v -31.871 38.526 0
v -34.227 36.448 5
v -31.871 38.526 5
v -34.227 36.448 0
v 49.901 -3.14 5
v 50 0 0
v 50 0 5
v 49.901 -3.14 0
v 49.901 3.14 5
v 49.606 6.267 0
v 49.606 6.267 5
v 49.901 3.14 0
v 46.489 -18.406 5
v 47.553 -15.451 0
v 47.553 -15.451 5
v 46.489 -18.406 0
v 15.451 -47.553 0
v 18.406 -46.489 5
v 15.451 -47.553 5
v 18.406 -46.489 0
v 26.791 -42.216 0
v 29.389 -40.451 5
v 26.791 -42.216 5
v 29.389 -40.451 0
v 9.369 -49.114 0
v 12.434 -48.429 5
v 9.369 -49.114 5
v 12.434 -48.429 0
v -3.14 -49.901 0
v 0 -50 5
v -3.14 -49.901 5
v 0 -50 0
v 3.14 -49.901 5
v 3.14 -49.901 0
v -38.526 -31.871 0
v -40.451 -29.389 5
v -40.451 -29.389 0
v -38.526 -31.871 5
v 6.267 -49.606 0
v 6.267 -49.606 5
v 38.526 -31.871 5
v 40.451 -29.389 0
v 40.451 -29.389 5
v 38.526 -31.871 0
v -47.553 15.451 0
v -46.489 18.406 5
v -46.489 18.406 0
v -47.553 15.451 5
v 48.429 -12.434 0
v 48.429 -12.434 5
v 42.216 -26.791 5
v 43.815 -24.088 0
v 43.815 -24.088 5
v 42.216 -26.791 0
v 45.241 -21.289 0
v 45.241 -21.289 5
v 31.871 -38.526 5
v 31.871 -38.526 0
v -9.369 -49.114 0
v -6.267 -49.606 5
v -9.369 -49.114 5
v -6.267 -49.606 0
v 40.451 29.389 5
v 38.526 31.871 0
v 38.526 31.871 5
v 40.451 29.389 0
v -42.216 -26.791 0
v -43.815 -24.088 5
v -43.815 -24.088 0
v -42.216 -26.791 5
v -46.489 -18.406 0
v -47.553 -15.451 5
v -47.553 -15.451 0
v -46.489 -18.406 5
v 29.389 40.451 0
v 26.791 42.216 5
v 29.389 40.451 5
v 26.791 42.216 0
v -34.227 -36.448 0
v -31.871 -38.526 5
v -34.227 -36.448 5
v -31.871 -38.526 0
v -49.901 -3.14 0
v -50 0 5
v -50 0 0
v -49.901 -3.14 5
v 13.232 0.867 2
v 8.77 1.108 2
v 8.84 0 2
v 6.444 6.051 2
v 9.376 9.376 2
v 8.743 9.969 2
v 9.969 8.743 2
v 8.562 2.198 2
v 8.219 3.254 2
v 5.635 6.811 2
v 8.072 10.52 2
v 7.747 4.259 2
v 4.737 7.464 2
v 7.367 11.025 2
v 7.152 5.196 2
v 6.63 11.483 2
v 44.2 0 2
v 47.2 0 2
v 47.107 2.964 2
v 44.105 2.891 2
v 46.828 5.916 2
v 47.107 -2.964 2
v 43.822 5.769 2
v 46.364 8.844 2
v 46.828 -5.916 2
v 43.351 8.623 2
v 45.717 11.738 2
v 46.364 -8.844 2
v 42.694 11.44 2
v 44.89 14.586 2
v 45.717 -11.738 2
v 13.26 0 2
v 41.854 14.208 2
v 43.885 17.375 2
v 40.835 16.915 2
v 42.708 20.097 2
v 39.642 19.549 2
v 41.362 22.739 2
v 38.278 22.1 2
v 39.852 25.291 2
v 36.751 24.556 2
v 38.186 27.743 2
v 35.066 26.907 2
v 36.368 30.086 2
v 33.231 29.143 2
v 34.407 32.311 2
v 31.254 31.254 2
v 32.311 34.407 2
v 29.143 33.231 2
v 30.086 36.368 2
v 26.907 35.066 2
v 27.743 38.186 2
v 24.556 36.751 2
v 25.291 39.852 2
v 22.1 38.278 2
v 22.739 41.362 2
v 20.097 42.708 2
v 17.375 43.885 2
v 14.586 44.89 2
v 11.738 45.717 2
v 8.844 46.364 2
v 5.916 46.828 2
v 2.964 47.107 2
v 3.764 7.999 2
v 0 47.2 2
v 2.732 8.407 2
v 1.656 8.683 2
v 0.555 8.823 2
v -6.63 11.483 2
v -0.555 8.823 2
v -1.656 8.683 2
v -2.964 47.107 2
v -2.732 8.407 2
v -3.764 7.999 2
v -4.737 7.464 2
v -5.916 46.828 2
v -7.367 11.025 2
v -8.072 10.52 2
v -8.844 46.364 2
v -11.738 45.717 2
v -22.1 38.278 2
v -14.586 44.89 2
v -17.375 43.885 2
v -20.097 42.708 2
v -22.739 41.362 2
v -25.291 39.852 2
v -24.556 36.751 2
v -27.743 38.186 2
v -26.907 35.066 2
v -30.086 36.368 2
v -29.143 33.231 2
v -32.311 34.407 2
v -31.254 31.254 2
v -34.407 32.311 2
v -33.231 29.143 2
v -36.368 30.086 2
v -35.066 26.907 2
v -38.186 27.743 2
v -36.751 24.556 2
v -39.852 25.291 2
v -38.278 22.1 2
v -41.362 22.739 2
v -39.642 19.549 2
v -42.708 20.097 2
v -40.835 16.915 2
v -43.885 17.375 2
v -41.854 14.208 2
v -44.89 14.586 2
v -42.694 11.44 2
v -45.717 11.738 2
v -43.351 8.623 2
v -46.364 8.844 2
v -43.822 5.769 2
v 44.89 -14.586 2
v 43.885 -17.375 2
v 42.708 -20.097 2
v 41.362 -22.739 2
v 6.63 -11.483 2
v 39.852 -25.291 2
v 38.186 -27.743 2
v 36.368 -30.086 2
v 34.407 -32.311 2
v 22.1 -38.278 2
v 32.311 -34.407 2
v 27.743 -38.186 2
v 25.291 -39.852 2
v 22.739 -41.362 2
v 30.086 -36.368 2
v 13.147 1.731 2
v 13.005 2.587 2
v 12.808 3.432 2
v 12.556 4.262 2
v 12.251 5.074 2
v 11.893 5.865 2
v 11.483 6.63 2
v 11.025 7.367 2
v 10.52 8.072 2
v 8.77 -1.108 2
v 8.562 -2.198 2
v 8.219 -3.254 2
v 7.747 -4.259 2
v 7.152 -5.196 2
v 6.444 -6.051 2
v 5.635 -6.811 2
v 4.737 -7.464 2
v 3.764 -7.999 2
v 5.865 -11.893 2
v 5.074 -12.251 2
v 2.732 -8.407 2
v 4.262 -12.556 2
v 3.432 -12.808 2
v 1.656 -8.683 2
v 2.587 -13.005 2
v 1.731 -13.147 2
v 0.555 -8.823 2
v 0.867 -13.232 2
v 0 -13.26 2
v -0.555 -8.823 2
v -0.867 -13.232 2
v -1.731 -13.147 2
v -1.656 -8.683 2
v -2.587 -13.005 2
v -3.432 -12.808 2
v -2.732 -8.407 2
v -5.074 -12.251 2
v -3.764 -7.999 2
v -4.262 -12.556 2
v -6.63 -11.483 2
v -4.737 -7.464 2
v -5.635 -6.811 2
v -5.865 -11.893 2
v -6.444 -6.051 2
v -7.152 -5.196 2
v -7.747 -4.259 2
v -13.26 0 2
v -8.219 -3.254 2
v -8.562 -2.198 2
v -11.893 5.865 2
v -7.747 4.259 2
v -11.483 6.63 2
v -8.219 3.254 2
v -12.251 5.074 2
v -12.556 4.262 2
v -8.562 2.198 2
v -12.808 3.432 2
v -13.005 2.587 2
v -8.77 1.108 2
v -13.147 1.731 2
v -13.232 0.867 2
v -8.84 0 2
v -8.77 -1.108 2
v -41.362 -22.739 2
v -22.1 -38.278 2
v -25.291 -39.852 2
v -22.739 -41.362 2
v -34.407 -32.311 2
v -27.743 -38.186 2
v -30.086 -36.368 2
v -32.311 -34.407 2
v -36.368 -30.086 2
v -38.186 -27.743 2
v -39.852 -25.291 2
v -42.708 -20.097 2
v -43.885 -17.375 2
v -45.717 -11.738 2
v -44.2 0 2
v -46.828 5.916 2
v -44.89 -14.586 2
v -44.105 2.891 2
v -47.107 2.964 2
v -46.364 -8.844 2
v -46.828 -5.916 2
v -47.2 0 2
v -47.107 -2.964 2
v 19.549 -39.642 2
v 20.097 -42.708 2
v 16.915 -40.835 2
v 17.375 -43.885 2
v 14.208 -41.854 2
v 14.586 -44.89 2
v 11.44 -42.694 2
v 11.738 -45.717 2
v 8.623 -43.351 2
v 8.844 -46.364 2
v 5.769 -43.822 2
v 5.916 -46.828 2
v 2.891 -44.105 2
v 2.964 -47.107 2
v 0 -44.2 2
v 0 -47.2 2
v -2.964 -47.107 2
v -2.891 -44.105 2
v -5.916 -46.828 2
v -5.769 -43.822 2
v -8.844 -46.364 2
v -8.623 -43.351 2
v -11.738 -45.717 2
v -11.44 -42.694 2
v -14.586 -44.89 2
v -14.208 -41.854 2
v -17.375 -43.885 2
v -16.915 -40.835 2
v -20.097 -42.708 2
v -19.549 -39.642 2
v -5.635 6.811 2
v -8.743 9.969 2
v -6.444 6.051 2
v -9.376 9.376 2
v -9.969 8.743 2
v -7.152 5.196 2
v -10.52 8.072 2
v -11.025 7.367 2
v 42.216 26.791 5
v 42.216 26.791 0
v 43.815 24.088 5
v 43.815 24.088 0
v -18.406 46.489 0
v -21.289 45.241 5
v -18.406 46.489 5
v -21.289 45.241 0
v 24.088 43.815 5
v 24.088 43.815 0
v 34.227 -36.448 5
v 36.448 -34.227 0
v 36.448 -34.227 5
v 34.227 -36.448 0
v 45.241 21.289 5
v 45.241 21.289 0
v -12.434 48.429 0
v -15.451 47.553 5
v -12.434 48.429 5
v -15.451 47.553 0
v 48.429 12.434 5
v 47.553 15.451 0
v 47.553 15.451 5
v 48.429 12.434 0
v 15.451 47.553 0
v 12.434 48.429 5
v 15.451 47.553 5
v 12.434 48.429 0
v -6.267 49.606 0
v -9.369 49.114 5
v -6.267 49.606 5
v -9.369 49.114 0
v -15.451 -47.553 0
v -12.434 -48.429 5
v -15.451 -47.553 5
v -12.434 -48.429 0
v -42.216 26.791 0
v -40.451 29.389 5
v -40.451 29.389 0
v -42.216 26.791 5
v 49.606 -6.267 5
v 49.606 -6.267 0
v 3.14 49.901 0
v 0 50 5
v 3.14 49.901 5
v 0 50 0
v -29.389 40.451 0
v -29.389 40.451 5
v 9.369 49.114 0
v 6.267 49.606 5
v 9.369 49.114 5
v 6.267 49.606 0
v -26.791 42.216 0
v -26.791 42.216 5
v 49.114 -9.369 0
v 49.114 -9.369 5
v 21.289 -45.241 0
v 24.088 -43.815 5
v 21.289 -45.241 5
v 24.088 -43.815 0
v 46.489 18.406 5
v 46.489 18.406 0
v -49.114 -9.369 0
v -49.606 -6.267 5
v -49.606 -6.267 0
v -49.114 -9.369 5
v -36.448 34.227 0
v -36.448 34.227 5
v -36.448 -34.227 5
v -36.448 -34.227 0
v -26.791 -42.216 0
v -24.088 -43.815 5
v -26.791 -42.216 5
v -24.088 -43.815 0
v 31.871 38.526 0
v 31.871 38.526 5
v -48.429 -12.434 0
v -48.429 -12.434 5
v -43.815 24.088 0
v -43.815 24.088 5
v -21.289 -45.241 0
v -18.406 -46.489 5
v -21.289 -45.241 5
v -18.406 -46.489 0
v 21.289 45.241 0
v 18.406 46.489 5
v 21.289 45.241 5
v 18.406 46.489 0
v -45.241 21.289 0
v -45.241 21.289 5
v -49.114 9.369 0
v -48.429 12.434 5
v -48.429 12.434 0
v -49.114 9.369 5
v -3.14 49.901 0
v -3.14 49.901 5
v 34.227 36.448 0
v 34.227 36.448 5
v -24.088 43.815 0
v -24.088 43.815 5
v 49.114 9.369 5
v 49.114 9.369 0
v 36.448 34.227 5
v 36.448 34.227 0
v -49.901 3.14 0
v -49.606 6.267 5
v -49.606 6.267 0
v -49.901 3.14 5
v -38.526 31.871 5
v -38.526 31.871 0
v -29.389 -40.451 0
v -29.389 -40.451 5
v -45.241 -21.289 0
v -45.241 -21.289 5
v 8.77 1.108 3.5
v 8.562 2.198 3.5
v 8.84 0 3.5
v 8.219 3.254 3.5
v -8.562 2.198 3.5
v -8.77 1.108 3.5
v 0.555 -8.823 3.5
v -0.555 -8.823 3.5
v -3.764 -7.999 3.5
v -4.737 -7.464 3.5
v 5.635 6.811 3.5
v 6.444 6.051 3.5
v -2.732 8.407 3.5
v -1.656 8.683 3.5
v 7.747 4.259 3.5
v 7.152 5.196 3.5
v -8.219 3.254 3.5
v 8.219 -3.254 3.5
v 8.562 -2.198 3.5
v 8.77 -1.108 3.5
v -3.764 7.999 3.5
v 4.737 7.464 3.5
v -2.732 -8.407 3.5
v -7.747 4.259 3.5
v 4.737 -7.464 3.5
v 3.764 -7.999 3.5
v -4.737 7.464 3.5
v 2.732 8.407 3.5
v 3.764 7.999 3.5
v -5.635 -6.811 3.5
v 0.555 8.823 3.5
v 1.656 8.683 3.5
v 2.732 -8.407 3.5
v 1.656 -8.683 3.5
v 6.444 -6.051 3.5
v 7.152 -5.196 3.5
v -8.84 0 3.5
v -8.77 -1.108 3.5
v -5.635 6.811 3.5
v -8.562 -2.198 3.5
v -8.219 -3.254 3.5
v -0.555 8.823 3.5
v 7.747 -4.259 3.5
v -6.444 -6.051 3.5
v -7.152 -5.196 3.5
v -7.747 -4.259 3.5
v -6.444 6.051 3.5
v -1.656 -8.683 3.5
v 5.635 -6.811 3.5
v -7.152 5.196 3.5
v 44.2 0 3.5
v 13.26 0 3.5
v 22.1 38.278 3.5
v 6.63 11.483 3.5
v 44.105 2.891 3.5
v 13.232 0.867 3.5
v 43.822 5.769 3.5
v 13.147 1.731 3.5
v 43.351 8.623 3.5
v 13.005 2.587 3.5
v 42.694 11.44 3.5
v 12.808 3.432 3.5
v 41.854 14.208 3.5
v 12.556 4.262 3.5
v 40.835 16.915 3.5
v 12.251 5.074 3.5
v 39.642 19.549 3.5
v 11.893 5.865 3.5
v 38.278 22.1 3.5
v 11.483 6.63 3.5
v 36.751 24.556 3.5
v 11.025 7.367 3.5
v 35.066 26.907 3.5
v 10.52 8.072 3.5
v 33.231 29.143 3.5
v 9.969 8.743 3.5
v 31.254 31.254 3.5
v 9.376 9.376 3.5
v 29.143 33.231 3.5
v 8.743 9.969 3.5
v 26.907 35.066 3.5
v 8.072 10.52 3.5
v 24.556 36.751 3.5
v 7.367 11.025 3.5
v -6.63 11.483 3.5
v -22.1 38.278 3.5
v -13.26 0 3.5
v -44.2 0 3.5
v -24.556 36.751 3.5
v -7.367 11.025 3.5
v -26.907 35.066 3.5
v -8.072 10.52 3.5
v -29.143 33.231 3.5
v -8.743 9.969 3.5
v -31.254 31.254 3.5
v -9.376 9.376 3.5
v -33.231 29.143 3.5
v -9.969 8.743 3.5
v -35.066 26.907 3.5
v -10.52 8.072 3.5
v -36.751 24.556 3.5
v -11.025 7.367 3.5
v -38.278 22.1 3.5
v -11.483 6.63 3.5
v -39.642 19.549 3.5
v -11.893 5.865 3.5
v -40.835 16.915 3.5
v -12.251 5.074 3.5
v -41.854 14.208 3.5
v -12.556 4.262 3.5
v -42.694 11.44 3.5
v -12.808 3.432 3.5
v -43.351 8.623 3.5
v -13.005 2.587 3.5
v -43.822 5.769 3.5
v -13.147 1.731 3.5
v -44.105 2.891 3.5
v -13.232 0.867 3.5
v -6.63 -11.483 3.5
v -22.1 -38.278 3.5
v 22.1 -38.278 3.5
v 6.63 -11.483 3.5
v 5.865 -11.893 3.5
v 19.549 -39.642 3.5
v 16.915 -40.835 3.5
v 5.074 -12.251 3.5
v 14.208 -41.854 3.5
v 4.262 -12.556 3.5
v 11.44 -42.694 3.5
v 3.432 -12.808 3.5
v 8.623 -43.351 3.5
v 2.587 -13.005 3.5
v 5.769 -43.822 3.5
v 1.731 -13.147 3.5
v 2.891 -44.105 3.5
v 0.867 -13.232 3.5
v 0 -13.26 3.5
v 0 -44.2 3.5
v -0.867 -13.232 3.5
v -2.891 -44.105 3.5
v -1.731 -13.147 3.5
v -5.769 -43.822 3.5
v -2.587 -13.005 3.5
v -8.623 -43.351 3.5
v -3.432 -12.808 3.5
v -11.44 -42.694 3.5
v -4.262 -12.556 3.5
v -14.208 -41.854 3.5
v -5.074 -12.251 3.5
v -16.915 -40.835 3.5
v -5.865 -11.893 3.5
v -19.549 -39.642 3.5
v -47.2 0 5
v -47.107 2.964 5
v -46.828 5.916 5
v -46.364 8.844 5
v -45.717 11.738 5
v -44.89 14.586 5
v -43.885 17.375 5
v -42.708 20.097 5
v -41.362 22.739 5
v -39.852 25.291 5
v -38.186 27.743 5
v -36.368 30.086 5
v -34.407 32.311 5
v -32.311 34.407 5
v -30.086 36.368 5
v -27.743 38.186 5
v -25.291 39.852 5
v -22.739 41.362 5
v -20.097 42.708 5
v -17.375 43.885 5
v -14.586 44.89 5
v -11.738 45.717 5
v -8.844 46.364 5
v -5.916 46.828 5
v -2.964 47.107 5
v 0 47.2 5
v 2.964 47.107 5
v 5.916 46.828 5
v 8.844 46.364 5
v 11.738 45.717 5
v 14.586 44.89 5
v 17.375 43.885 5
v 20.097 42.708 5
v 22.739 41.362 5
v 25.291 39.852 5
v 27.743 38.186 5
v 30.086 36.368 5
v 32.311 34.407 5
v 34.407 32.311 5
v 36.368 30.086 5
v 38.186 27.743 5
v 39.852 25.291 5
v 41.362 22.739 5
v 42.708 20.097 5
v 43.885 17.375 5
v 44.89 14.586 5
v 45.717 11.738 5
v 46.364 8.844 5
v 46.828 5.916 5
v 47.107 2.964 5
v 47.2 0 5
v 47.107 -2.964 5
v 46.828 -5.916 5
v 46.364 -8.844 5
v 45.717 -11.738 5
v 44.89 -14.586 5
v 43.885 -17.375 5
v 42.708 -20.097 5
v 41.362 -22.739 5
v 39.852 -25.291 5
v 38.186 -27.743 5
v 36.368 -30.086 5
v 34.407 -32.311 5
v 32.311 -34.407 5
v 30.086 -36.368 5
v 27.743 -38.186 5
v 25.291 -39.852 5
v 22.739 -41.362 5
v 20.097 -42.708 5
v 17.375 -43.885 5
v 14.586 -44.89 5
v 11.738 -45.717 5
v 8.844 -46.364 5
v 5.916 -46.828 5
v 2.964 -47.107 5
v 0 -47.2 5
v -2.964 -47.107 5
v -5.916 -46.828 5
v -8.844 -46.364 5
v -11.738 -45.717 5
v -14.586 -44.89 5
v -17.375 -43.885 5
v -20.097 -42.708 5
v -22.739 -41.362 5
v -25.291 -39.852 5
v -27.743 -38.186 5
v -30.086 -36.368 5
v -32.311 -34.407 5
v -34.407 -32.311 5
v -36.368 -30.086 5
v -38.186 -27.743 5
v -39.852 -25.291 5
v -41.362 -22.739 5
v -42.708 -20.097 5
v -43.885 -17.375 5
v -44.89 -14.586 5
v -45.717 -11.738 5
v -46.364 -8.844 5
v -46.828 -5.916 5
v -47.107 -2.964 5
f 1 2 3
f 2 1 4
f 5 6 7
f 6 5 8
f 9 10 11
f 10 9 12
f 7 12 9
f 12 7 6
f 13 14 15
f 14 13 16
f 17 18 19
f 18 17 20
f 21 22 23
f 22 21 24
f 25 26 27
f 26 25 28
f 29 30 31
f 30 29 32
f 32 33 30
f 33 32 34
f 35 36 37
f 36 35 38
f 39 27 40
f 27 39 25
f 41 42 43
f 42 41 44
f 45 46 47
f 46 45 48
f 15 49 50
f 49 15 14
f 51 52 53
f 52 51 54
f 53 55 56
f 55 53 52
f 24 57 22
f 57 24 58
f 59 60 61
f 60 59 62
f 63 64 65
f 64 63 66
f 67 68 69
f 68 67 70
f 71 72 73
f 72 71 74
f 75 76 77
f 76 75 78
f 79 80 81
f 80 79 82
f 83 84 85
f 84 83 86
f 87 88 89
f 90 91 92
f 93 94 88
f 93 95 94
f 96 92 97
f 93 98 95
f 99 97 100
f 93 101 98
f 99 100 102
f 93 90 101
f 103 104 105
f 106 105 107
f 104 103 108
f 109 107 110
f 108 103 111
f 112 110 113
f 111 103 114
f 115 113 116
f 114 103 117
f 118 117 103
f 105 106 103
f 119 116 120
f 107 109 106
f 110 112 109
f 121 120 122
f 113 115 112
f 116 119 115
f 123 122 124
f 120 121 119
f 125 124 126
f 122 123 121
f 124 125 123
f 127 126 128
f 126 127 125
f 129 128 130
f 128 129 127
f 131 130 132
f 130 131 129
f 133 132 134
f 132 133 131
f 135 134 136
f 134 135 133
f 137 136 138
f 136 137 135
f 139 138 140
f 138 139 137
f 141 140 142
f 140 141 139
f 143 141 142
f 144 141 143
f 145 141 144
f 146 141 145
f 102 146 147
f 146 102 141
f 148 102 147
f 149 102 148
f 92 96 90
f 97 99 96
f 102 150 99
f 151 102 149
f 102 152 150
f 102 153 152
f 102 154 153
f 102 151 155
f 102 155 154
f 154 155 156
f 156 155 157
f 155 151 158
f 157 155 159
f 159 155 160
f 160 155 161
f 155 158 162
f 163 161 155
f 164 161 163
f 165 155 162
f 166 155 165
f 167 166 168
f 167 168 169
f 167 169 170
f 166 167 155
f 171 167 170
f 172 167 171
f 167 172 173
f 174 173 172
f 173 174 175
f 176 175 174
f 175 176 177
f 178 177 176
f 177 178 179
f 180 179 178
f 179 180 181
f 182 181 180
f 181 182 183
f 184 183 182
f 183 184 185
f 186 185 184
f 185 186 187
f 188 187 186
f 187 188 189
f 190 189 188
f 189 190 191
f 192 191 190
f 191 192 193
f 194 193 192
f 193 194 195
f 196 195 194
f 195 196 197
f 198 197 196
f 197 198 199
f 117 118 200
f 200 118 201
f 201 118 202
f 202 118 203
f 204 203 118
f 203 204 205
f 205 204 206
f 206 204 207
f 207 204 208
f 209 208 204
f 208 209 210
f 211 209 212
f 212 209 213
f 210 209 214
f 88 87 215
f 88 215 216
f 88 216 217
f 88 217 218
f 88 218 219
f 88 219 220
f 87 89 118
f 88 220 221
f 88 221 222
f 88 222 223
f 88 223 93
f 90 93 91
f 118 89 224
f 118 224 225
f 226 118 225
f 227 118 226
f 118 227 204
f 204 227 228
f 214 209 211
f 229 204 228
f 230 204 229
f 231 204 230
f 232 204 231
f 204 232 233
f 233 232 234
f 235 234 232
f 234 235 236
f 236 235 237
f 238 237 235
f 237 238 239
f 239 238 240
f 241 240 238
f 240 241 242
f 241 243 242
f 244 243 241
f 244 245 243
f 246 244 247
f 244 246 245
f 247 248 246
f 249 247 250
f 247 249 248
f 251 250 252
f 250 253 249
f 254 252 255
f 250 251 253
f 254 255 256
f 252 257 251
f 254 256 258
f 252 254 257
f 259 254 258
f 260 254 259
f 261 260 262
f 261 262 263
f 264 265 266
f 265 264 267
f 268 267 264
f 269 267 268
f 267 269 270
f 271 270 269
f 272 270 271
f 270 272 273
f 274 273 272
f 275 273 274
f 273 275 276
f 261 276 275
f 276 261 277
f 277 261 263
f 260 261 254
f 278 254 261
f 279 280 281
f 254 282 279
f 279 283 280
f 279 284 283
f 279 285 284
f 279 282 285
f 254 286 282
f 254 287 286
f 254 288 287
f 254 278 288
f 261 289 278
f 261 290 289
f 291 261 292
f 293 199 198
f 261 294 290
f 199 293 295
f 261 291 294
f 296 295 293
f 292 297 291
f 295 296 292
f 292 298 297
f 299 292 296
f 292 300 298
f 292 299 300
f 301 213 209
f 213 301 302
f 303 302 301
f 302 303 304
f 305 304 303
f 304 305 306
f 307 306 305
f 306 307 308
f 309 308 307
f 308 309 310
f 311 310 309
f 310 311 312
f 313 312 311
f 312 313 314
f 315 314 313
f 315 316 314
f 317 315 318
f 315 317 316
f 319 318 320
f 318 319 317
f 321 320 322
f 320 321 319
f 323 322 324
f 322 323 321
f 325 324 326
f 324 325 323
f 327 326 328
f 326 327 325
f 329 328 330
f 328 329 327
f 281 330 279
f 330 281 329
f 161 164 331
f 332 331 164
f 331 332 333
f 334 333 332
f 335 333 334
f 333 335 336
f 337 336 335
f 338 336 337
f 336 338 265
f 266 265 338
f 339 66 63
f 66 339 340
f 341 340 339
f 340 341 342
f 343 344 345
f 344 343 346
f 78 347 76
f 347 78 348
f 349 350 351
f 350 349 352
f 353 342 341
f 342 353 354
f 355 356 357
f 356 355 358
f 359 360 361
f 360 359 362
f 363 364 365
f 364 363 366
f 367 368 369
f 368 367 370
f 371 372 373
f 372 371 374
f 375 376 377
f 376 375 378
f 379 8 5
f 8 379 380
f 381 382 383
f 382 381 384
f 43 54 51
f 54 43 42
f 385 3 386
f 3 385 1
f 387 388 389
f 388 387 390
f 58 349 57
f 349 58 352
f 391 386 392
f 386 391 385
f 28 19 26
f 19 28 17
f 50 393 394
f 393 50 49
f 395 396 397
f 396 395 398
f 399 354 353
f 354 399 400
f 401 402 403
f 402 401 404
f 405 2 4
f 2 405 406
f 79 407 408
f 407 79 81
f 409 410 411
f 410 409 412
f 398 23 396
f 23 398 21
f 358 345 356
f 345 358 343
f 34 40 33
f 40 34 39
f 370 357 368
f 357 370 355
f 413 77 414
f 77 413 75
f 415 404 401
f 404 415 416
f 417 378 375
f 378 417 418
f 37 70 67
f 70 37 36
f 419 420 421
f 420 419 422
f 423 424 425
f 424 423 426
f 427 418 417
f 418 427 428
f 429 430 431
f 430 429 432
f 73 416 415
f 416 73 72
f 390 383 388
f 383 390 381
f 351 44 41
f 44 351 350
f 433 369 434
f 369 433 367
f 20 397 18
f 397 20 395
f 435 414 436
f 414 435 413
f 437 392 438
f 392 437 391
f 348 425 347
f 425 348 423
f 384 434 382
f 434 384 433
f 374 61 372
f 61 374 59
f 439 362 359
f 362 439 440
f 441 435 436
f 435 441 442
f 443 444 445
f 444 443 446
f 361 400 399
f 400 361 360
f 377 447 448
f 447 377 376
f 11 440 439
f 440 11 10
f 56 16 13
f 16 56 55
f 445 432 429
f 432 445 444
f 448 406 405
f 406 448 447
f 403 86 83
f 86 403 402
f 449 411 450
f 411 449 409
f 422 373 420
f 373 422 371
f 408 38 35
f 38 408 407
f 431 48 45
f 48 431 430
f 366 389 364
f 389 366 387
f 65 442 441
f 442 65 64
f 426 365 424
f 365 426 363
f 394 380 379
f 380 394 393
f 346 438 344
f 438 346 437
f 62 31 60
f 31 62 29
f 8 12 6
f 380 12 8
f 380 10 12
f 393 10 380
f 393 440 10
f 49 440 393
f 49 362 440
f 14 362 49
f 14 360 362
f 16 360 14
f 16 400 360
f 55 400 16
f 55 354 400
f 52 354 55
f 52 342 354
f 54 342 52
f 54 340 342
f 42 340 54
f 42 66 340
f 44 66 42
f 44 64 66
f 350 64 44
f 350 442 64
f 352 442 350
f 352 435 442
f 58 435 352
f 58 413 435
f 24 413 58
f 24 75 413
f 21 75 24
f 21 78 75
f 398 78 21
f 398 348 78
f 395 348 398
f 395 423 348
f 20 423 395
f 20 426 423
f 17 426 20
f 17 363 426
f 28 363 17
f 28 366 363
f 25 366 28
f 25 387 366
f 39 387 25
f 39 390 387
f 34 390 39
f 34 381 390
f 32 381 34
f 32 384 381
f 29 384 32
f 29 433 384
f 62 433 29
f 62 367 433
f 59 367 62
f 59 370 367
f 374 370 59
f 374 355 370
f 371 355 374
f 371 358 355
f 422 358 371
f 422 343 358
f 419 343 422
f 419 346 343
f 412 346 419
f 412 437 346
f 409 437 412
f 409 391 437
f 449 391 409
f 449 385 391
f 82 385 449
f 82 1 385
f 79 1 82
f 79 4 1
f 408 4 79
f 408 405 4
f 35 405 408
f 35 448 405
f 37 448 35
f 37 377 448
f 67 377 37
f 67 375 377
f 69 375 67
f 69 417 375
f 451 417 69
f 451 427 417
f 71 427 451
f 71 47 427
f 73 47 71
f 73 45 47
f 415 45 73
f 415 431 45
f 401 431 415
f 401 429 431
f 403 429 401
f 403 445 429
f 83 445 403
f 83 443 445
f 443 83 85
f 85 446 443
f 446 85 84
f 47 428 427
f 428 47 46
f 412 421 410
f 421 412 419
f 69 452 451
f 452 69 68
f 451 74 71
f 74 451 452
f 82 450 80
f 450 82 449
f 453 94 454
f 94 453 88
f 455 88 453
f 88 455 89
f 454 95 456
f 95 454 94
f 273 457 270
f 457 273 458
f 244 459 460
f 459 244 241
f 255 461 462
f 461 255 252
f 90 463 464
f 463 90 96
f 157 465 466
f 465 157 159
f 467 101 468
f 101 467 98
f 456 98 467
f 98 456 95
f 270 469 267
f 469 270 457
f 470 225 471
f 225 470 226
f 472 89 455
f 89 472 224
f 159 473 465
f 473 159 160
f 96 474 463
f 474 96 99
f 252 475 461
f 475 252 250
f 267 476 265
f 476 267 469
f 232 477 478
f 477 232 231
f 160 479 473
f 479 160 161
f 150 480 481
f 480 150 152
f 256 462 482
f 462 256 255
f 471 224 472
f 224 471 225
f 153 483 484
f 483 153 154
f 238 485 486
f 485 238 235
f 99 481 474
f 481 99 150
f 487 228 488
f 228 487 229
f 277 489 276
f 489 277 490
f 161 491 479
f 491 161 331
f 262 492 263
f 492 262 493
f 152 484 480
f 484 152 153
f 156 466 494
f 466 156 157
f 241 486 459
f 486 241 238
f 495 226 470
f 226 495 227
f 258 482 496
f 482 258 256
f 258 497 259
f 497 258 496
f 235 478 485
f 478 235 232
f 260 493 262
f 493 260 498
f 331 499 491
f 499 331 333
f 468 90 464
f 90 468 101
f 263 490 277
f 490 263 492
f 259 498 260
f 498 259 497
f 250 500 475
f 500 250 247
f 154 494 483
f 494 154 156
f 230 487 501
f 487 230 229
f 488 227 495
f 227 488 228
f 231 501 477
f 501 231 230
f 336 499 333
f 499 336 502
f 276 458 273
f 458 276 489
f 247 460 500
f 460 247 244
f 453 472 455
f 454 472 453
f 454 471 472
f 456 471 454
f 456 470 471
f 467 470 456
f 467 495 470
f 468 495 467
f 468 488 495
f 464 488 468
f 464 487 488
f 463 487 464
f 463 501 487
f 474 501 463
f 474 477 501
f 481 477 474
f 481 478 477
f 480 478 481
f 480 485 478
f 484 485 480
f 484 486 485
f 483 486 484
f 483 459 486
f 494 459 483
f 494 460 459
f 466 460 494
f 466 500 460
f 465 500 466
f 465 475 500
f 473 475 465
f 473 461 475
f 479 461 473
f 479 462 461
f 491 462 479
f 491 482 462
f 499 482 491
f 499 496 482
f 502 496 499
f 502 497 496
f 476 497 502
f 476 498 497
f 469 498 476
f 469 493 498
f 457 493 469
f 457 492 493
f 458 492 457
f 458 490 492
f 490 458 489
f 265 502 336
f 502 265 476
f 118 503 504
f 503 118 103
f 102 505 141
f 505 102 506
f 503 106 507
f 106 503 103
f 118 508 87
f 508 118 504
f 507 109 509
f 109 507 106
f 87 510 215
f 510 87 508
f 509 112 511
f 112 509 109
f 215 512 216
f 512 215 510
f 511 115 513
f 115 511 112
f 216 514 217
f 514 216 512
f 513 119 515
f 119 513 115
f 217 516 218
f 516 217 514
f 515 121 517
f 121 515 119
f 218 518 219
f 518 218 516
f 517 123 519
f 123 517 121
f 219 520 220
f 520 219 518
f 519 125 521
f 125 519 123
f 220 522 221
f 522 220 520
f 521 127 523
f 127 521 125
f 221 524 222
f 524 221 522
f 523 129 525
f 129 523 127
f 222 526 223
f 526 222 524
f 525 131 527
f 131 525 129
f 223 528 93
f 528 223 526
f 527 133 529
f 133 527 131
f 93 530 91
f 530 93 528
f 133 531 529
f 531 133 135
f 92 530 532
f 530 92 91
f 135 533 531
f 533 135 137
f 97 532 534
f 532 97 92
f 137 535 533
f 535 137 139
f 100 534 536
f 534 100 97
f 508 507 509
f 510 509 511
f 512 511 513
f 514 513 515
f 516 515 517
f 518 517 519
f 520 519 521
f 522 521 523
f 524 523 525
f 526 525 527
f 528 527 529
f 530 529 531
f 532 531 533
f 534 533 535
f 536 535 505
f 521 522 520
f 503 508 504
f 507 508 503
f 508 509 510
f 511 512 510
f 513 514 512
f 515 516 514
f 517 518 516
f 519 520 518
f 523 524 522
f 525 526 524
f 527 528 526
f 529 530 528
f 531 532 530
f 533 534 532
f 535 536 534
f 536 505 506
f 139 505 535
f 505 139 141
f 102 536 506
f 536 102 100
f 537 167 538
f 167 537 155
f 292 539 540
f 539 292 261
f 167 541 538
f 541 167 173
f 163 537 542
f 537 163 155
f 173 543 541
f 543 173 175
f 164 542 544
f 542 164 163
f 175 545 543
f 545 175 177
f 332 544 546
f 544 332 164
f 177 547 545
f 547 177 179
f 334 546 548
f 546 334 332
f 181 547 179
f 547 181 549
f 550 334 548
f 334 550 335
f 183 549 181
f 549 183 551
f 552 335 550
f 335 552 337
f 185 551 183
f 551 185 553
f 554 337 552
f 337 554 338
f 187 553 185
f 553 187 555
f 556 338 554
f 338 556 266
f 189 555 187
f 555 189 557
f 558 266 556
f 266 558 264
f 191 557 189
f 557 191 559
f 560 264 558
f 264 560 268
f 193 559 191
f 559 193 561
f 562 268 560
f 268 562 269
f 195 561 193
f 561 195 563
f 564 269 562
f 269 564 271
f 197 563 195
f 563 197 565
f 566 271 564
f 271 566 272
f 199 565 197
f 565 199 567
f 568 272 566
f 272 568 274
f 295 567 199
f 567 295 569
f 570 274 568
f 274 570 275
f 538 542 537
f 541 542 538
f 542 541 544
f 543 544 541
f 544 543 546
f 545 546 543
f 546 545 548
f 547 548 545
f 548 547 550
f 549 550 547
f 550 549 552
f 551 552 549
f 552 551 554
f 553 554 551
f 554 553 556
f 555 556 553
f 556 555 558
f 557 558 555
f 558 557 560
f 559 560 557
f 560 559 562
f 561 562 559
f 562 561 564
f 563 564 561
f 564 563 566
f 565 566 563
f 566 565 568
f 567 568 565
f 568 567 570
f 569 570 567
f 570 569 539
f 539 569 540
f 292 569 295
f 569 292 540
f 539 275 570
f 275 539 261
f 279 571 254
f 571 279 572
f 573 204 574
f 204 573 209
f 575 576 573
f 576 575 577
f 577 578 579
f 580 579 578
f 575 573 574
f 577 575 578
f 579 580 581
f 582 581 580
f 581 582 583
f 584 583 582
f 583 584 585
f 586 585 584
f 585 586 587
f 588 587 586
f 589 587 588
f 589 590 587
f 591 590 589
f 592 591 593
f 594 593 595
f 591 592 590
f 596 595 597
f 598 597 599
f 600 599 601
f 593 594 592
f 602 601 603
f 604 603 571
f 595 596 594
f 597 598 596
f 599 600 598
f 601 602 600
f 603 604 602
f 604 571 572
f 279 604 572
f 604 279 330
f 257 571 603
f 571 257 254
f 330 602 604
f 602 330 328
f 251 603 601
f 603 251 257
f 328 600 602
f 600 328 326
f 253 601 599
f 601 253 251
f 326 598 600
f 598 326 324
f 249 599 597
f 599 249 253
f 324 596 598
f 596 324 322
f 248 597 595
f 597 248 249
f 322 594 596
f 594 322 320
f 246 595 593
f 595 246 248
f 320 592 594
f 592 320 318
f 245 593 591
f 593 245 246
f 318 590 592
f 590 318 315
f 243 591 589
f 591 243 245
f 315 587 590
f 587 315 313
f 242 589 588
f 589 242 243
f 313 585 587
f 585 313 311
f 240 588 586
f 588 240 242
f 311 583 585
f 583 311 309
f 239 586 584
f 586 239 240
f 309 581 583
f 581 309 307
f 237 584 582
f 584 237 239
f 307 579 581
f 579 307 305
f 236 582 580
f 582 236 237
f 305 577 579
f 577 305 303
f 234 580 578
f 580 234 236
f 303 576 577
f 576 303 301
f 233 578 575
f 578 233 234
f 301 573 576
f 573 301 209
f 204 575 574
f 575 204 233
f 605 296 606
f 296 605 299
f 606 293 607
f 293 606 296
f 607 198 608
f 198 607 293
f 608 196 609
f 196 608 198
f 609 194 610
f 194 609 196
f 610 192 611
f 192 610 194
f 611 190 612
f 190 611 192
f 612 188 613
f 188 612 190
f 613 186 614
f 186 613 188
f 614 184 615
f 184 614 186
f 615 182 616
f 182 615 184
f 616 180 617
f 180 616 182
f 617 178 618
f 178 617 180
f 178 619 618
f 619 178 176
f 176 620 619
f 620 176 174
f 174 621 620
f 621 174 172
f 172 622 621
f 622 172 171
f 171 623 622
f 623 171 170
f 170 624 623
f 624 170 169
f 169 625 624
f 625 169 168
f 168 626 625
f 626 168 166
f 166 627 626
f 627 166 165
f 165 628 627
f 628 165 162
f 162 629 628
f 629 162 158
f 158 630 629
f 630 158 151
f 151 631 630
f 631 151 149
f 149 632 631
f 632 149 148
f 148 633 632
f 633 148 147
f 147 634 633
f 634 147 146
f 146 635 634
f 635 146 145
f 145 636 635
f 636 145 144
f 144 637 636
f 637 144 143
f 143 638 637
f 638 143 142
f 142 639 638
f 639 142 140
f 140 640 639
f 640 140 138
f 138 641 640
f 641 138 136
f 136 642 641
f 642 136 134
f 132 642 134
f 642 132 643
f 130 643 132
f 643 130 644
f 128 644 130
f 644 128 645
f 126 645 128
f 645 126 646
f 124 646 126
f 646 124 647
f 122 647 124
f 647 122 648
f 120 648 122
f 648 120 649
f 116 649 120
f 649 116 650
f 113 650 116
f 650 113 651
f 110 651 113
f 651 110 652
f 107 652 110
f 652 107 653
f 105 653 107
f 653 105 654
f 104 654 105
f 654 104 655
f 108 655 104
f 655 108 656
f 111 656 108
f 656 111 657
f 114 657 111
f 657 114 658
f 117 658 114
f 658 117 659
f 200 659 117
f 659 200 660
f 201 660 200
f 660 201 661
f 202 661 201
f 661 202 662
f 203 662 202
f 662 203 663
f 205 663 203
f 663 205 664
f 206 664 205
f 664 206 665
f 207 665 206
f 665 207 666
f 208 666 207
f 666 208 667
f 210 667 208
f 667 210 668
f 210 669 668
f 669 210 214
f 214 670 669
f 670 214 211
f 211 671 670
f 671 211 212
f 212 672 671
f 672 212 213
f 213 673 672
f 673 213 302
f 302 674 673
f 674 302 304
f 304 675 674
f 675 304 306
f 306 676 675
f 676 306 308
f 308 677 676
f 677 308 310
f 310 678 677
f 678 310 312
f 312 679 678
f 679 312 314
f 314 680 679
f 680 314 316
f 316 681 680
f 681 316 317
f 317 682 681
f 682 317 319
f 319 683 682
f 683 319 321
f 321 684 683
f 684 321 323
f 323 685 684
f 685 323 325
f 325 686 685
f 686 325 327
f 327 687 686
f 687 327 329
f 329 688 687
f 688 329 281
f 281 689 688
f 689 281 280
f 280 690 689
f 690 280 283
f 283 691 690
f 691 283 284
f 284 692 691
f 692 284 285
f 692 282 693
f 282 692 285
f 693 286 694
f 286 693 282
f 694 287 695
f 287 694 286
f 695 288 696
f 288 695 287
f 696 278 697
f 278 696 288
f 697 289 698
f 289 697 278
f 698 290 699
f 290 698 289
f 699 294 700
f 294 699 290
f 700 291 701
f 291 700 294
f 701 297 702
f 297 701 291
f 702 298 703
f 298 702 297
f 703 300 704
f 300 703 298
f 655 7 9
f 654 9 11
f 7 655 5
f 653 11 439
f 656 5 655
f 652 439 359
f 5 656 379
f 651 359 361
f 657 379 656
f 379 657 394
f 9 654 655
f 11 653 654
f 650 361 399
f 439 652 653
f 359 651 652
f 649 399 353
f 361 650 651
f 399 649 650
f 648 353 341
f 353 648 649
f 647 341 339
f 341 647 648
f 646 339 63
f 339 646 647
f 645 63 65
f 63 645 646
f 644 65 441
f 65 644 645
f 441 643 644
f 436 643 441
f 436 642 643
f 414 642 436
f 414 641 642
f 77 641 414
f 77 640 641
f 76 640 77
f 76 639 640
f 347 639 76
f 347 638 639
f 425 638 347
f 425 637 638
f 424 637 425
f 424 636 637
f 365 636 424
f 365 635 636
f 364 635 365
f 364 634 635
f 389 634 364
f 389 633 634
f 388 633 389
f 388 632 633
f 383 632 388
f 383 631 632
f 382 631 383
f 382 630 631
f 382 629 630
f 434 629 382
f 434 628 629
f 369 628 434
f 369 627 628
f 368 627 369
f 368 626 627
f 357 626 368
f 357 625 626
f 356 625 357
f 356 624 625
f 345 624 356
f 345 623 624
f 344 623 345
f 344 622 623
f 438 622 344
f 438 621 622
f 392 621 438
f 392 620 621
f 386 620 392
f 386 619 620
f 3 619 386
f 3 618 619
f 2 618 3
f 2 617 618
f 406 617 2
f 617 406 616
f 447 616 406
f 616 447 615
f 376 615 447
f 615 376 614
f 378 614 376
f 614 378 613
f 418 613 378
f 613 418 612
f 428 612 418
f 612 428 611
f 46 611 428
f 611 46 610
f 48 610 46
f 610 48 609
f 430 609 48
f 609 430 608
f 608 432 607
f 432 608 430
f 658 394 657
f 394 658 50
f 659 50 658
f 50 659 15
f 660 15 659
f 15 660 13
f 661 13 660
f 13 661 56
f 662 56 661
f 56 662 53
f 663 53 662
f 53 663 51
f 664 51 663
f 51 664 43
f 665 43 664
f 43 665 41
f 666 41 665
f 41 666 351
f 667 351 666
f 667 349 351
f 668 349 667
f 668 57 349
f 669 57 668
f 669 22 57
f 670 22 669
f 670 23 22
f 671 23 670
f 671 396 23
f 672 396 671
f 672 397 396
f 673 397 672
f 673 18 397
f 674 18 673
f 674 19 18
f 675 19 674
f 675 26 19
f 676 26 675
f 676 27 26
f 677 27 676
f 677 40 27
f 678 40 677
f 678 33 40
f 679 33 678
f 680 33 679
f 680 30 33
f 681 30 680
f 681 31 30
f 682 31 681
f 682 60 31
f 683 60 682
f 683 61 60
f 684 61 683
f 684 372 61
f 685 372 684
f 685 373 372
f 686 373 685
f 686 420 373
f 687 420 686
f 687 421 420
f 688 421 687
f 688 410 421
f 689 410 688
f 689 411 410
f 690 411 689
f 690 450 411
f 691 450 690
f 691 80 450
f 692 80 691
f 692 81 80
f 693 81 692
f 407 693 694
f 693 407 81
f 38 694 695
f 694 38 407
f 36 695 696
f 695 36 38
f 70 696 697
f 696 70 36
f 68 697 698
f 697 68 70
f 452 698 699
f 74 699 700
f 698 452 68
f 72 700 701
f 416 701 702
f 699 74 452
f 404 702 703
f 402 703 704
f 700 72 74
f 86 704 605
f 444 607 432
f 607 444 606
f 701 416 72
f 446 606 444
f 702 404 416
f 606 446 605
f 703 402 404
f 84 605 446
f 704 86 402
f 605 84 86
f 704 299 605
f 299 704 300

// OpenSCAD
/*
For inner circle of radius R, the inside radius of the blades is 1.5R and the outer radius of the blades is 5R. The blades are separated by 60°.
*/

// Coaster Diameter (mm)
coaster_diameter = 100; // [1:200]
// Height of the base (mm)
base_height = 2; // [0:10]
// Height of the rim (mm)
rim_height = 5; // [0:10]
// Thickness of the rim (mm)
rim_thickness = 2.8; // [0:10]
// Height of the radiation symbol (mm)
symbol_height = 3.5; // [0:10]
// Gap between symbol and rim (mm)
gap_thickness = 3; // [0:10]

/* [Hidden] */
$fn = 100;

diam = coaster_diameter;
baseH = base_height;
rimH = rim_height;
rimT = rim_thickness;
symH = symbol_height;
gap = gap_thickness;

symDout = diam-2*rimT-2*gap;
centerD = symDout/5.0;
symDin = centerD*1.5;

//color("yellow")
cylinder(baseH,d1=diam,d2=diam);

//color("black")
{
    cylinder(symH,d1=centerD,d2=centerD,$fn=50);
    rotate_extrude(angle=60) translate([symDin/2,0,0]) square([(symDout-symDin)/2,symH]);
    rotate([0,0,120]) rotate_extrude(angle=60) translate([symDin/2,0,0]) square([(symDout-symDin)/2,symH]);
    rotate([0,0,-120]) rotate_extrude(angle=60) translate([symDin/2,0,0]) square([(symDout-symDin)/2,symH]);
    translate([0,0,baseH]) rotate_extrude(angle=360) translate([diam/2-rimT,0,0]) square([rimT,rimH-baseH]);
}
